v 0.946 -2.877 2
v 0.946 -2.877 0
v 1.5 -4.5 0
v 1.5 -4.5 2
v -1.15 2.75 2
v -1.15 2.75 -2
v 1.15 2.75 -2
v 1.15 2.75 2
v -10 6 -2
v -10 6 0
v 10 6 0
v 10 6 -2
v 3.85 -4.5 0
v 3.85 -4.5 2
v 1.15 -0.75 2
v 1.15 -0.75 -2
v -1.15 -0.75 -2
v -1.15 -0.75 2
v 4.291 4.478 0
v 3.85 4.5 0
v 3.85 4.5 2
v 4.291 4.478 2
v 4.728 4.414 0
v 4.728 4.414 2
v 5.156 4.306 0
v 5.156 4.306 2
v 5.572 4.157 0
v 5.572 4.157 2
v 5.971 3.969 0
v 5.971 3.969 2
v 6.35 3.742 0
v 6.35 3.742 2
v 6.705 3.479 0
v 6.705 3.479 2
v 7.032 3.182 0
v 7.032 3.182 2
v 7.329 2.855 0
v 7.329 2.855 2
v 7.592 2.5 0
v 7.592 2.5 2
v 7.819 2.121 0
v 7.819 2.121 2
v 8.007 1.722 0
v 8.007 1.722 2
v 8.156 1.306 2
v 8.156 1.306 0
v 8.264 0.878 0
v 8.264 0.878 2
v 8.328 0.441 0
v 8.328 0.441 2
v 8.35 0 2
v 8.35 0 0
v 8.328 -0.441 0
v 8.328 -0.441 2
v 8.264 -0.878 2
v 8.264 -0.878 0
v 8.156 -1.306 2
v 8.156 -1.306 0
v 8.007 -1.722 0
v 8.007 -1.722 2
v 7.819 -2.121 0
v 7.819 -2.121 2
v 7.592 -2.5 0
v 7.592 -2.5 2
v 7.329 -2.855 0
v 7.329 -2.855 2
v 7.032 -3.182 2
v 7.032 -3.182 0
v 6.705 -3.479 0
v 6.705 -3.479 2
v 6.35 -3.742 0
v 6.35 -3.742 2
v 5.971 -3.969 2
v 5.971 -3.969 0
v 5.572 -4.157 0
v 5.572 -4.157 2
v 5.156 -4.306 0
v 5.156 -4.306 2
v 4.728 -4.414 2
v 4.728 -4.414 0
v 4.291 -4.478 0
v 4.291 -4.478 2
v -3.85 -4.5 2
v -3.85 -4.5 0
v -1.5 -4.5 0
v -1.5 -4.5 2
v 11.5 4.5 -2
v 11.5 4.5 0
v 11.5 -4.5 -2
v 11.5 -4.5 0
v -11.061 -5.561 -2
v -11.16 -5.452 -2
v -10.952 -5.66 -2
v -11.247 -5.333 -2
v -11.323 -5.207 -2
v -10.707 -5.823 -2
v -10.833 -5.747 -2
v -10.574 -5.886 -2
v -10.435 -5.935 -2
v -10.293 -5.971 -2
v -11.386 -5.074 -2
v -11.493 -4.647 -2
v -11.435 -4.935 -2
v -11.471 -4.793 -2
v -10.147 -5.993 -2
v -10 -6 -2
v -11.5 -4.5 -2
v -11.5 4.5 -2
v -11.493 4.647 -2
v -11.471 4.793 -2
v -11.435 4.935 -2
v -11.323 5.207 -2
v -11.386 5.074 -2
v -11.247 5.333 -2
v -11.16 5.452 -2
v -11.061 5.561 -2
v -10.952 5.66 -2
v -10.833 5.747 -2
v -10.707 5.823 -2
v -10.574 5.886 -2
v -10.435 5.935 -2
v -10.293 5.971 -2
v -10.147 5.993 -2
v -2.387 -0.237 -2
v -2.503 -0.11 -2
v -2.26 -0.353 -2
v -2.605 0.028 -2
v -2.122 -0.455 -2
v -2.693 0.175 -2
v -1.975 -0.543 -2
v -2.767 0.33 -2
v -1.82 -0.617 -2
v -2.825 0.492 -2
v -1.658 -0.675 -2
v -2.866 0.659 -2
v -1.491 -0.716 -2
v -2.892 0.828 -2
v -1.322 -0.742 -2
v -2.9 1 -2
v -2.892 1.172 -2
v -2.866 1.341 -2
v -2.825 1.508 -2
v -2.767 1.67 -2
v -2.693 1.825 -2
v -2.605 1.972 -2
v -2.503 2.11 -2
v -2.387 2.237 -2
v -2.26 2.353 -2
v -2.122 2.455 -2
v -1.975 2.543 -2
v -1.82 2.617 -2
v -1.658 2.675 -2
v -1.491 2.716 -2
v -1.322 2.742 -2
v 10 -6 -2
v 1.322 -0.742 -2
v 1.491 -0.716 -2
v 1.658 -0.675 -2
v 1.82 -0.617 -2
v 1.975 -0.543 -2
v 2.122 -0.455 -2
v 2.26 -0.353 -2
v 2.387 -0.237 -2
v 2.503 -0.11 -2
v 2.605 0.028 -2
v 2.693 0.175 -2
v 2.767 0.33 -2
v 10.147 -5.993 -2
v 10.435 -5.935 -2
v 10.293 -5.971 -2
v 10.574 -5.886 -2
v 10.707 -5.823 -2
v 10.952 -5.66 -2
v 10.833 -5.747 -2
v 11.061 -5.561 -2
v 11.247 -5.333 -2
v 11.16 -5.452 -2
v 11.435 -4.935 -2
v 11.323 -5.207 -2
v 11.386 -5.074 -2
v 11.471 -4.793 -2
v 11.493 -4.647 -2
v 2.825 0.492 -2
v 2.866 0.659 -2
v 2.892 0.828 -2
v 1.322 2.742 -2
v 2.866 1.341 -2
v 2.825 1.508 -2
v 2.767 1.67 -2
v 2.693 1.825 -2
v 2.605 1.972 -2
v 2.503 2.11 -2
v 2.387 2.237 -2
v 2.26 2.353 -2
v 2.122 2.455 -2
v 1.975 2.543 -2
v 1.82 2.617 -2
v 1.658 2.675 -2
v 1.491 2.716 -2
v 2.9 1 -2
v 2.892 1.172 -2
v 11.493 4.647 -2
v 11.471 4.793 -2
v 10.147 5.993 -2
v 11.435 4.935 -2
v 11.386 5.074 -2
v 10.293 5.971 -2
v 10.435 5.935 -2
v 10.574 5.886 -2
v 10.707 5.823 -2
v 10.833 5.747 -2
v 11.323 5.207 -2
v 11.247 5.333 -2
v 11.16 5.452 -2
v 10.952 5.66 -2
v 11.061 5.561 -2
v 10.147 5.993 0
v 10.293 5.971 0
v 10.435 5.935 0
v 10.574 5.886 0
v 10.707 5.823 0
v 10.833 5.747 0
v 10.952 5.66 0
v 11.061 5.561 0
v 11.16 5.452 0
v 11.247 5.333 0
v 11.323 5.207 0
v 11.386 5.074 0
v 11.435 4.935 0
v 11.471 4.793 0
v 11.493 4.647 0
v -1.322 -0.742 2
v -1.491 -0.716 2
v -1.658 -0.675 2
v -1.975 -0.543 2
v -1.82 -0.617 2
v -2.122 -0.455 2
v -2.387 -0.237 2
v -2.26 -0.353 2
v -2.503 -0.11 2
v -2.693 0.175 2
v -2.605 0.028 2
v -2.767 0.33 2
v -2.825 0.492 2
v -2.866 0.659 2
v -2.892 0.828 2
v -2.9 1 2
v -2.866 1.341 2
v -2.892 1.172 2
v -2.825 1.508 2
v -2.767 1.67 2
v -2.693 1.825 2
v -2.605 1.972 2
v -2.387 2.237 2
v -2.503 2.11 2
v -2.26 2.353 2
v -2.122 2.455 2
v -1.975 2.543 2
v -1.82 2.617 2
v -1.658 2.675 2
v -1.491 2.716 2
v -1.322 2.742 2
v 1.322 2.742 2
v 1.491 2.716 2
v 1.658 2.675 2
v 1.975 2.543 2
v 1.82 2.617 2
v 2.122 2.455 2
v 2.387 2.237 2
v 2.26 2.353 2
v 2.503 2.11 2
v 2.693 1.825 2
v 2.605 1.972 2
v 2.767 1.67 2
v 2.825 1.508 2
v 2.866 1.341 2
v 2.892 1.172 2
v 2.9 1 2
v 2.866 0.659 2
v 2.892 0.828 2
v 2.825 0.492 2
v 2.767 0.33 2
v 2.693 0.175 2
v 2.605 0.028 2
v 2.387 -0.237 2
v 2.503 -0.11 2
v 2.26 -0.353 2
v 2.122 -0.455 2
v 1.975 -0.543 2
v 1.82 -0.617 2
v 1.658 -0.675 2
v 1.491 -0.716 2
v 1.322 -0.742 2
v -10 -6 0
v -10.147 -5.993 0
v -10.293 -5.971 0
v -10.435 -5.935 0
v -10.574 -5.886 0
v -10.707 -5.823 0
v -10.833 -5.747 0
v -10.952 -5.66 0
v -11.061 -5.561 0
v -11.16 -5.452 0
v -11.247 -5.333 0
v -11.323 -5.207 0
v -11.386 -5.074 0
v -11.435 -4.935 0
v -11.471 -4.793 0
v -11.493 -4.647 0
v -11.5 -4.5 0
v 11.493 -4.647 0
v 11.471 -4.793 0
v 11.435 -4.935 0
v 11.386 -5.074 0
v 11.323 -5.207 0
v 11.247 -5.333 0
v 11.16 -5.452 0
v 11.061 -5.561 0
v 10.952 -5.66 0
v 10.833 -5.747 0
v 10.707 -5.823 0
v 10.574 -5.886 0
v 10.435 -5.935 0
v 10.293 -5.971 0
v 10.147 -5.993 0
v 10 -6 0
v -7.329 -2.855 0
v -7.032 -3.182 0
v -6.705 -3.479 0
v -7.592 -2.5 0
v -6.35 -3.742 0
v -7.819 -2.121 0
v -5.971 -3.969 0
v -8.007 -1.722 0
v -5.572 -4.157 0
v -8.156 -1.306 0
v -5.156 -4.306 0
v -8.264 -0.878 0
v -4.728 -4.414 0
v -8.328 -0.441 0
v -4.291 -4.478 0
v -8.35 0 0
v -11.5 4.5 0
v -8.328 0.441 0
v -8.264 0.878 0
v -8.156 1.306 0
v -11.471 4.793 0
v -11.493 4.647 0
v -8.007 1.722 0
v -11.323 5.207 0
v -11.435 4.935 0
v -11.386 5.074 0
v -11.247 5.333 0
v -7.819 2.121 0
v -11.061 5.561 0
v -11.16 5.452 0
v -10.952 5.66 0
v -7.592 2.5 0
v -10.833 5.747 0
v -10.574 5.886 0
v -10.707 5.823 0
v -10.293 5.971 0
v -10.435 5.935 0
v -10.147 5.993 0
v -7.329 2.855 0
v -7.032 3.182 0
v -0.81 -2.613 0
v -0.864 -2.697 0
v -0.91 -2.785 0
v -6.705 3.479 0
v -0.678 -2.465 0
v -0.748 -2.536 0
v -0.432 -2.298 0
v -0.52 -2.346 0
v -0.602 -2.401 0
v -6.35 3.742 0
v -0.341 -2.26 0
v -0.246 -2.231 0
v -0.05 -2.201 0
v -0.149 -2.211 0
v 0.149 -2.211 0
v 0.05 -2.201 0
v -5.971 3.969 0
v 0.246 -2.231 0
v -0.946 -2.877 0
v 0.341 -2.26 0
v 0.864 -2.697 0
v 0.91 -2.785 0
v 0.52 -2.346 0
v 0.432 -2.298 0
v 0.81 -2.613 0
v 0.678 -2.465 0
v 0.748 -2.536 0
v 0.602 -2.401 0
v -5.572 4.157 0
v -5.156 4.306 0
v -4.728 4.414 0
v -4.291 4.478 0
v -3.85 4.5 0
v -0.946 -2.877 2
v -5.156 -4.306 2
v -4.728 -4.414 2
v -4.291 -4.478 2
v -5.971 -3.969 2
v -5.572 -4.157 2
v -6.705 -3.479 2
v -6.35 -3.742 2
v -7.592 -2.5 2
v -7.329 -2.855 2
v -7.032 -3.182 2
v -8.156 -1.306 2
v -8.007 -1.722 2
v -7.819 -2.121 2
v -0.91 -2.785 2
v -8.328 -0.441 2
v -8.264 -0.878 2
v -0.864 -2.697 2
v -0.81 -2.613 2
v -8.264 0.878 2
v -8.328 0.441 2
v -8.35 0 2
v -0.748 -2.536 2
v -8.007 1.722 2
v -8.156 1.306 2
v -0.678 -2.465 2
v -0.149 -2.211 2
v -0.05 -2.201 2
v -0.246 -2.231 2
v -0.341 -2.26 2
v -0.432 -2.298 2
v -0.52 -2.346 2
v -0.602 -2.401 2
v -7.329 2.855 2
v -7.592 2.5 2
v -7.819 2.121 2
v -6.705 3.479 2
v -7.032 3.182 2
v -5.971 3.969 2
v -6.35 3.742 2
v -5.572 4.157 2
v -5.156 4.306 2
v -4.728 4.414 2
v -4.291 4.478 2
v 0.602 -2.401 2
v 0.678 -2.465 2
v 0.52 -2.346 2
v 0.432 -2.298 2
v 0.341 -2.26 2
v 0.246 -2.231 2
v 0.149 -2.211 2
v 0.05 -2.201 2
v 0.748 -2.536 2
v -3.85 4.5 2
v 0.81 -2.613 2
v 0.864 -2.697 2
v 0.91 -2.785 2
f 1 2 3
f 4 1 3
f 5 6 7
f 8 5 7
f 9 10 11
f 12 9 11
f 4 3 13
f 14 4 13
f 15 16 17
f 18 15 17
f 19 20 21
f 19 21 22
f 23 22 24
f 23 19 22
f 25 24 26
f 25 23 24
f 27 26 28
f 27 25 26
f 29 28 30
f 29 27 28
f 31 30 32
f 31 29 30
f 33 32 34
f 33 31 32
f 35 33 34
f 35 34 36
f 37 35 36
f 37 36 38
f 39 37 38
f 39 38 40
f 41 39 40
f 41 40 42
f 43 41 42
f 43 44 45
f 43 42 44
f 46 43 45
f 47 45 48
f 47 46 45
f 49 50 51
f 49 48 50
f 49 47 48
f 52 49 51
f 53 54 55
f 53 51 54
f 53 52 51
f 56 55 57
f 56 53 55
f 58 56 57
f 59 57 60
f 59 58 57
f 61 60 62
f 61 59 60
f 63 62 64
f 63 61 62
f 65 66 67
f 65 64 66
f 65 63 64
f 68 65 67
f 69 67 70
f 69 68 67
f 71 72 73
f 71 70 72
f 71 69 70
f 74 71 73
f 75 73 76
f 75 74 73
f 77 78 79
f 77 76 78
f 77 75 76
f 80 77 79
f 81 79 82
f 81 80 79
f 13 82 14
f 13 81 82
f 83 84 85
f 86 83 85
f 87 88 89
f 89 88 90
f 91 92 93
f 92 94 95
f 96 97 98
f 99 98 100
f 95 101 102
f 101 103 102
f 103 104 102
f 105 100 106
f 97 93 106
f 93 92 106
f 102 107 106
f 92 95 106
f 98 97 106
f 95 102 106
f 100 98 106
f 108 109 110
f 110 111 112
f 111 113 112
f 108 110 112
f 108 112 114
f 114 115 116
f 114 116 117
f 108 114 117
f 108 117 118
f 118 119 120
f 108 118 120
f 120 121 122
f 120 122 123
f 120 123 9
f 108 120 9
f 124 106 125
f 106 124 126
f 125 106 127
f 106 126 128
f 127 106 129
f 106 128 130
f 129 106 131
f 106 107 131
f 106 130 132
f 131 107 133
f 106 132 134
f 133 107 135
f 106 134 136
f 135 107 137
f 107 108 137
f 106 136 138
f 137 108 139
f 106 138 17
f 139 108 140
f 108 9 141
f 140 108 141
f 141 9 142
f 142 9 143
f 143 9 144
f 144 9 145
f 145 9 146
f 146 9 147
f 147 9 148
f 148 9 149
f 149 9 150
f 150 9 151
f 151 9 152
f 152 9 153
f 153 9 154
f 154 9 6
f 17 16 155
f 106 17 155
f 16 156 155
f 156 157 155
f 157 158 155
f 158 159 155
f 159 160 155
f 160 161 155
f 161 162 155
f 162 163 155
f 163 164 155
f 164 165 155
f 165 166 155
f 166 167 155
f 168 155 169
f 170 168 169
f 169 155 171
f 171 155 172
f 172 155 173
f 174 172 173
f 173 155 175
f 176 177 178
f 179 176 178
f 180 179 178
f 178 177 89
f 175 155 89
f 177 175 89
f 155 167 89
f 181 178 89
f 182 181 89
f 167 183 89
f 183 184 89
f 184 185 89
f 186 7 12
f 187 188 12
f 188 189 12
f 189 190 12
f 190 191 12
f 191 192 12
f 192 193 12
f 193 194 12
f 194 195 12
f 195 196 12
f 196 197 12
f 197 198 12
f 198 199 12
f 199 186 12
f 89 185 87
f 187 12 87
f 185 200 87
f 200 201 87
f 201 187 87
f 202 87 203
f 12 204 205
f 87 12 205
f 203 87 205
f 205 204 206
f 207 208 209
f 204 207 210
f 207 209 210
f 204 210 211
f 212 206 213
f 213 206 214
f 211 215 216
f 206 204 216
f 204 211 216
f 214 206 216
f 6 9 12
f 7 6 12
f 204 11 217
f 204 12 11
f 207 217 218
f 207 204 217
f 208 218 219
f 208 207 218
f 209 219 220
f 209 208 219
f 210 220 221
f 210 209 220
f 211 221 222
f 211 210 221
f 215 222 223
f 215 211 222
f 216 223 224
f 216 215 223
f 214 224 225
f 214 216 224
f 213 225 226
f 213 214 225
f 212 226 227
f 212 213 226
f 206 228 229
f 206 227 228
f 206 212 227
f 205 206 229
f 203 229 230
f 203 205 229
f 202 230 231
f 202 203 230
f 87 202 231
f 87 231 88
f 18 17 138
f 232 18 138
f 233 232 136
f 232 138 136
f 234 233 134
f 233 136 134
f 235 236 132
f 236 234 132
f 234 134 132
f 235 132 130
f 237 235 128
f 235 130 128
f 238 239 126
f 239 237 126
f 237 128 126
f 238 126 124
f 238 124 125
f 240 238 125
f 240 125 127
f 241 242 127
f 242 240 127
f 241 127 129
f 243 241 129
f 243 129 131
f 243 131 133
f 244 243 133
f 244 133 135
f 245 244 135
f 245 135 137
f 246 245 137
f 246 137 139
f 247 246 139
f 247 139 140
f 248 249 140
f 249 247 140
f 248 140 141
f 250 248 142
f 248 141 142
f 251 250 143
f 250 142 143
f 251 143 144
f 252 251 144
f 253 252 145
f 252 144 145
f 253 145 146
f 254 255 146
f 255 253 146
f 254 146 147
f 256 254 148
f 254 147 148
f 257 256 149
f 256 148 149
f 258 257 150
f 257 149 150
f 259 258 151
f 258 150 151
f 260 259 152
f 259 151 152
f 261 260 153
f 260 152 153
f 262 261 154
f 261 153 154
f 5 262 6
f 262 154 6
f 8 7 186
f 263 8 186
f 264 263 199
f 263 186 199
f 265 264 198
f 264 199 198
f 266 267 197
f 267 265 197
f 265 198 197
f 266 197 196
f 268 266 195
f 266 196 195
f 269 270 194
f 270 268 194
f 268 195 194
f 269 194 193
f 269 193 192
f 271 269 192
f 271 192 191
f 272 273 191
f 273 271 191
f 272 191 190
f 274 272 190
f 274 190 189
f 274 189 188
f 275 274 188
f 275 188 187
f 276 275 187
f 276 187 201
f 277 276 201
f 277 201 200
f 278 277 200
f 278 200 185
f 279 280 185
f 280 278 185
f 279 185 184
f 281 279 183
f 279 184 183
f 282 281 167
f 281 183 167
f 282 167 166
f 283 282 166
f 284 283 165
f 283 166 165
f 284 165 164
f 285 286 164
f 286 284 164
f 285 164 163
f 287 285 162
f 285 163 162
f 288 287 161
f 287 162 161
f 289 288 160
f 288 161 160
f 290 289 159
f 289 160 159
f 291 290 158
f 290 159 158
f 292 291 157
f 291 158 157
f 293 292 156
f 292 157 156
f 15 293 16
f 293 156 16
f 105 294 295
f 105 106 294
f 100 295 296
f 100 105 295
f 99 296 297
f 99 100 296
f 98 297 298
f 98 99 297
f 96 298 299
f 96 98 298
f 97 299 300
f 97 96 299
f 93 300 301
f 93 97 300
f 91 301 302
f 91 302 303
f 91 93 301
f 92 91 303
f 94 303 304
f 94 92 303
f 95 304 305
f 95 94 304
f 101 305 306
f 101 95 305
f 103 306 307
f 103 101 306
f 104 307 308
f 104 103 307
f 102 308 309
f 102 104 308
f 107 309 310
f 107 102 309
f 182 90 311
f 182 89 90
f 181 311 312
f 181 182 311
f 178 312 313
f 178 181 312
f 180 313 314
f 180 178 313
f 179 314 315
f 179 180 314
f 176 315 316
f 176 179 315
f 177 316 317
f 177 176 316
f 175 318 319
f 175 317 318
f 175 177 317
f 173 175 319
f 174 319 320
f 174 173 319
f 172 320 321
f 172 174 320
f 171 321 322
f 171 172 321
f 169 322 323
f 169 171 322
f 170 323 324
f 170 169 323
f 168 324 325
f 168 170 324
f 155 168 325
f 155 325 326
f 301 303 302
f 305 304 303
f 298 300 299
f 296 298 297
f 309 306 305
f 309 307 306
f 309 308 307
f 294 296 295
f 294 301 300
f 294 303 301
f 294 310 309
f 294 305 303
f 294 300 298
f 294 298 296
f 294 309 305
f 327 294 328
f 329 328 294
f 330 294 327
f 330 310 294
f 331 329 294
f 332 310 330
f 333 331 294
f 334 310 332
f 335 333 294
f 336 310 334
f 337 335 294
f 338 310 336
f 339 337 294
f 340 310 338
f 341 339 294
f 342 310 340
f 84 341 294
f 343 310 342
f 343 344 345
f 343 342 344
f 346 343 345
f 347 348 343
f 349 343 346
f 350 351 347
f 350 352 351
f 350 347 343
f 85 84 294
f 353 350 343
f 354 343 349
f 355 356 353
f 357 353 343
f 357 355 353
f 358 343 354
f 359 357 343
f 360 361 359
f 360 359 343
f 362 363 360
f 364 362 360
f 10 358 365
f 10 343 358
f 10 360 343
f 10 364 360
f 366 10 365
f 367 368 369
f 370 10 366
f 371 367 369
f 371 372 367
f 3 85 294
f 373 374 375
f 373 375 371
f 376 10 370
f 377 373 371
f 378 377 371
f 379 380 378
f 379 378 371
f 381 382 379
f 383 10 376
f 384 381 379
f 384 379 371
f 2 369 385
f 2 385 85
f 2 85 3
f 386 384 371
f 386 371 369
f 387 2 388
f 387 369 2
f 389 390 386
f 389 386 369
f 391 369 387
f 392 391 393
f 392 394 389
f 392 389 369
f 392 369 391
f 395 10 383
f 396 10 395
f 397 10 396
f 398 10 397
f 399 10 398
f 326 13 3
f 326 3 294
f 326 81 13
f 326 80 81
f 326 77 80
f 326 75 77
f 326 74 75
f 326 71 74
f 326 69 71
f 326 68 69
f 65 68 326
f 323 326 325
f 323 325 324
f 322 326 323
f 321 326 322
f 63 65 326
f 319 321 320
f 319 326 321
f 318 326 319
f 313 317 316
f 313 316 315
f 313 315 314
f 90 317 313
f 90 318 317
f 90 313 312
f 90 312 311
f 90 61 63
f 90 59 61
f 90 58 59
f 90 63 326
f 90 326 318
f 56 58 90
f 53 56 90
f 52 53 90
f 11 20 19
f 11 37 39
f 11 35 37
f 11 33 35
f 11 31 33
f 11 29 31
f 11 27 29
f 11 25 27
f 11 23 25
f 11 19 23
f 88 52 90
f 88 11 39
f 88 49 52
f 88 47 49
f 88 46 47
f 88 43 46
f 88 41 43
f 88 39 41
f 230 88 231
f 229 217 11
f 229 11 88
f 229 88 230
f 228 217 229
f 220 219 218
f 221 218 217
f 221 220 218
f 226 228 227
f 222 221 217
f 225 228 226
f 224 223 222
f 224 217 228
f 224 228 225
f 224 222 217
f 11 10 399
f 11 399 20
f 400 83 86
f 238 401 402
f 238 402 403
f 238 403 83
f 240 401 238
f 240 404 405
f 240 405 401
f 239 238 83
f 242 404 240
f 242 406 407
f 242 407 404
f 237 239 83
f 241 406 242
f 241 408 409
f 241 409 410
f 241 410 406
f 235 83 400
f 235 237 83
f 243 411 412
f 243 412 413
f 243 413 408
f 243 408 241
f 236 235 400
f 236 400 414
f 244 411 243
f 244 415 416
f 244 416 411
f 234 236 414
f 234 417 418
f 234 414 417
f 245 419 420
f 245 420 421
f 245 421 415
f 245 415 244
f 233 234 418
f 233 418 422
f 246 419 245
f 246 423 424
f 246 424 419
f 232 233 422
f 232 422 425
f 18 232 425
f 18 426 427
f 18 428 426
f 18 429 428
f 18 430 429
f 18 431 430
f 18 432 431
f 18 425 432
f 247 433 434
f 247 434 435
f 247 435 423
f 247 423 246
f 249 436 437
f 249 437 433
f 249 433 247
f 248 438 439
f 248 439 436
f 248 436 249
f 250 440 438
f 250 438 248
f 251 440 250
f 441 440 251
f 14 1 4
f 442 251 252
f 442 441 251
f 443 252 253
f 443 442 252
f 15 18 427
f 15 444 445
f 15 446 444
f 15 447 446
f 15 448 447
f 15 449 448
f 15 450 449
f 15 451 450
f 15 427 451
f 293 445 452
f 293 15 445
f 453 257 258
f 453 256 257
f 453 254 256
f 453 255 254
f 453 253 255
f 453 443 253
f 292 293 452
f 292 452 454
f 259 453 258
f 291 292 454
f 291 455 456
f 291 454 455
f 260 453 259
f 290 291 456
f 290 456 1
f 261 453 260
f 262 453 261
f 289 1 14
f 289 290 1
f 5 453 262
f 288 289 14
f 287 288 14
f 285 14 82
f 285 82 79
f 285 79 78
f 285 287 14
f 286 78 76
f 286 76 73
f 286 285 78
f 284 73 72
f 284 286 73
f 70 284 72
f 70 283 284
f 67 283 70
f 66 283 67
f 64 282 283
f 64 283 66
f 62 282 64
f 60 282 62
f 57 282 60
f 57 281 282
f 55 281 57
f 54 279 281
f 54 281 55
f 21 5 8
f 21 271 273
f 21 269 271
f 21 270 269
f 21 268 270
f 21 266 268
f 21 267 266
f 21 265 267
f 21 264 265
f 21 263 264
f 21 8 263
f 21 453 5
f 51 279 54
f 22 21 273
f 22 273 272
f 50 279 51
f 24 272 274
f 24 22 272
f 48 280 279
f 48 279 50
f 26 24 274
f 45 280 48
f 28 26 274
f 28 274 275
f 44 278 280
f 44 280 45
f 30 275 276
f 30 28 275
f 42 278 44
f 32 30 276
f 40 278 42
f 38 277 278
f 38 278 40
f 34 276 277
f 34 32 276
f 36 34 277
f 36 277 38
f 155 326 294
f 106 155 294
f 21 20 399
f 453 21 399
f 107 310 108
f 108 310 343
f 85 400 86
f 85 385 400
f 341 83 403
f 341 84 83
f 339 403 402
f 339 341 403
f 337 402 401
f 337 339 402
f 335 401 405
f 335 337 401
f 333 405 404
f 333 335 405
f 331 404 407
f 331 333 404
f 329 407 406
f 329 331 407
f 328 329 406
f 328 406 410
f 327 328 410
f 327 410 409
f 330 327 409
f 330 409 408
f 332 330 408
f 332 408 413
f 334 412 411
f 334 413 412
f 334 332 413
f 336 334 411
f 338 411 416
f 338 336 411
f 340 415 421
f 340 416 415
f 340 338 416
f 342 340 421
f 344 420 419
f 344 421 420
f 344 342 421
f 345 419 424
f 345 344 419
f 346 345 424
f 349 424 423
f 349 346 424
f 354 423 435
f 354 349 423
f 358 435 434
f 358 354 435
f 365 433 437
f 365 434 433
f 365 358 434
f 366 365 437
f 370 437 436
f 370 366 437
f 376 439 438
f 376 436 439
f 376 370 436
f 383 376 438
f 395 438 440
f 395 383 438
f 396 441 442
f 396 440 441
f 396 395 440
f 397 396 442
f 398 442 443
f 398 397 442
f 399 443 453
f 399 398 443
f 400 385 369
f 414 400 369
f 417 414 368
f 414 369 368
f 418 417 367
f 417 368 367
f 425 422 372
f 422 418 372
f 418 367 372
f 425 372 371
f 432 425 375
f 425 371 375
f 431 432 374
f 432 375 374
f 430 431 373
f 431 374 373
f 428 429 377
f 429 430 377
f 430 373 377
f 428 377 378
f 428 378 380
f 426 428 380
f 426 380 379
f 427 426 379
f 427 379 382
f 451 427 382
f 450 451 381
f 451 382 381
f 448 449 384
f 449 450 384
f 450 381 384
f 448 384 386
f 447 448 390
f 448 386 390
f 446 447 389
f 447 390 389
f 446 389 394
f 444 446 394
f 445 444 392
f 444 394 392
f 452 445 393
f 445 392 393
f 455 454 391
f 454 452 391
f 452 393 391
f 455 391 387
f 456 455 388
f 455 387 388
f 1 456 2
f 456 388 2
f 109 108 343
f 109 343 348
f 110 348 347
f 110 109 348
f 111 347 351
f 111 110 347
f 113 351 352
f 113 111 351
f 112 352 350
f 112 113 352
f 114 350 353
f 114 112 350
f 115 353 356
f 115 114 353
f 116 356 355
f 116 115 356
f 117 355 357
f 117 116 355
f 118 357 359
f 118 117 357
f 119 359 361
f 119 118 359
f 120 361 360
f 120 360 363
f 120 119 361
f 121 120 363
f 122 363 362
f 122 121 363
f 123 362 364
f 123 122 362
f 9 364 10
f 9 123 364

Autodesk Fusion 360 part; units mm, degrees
sketch "Sketch1" plane through (0, 0, 0) normal (0, 0, 1) x (1, 0, 0)
  line L0 (-3.85, 0) -> (3.85, 0) construction
  line L1 (-3.85, 0) -> (-8.35, 0) construction
  line L2 (3.85, 0) -> (8.35, 0) construction
  line L3 (0, 0) -> (0, -3.2) construction
  line L4 (-3.85, -4.5) -> (3.85, -4.5)
  line L5 (3.85, 4.5) -> (-3.85, 4.5)
  arc A0 (-3.85, 4.5) -> (-3.85, -4.5) centre (-3.85, 0) ccw
  arc A1 (3.85, -4.5) -> (3.85, 4.5) centre (3.85, 0) ccw
  line L6 (-0.9465, -2.8772) -> (-1.5, -4.5)
  line L7 (0.9465, -2.8772) -> (1.5, -4.5)
  arc A2 (0.9465, -2.8772) -> (-0.9465, -2.8772) centre (0, -3.2) ccw
  line L8 (11.5, -6) -> (-11.5, -6)
  line L9 (-11.5, -6) -> (-11.5, 6)
  line L10 (-11.5, 6) -> (11.5, 6)
  line L11 (11.5, 6) -> (11.5, -6)
  line L12 (11.5, -6) -> (-11.5, 6) construction
  line L13 (-11.5, -6) -> (11.5, 6) construction
  line L14 (-1.15, 2.75) -> (1.15, 2.75)
  line L15 (1.15, -0.75) -> (-1.15, -0.75)
  arc A3 (1.15, -0.75) -> (1.15, 2.75) centre (1.15, 1) ccw
  arc A4 (-1.15, 2.75) -> (-1.15, -0.75) centre (-1.15, 1) ccw
  line L16 (-1.15, 1) -> (1.15, 1)
  dimension "d1" = 9
  dimension "d2" = 16.7
  dimension "d3" = 2
  dimension "d4" = 3.2
  dimension "d5" = 3
  dimension "d6" = 12
  dimension "d7" = 23
  dimension "d12" = 3.5
  dimension "d13" = 2.3
  dimension "d20" = 1
extrude "Extrude1" add sketch "Sketch1" against normal blind 2 contours L4 L5 A0 A1 L6 L7 A2 | L4 L6 L7 A2 | L8 L9 L10 L11 | L14 L15 A3 A4
extrude "Extrude2" add sketch "Sketch1" along normal blind 2 contours L4 L5 A0 A1 L6 L7 A2 | L14 L15 A3 A4
extrude "Extrude3" cut sketch "Sketch1" along normal up to surface (2 mm away) and the other way up to surface (2 mm away) contours L14 L15 A3 A4
fillet "Fillet1" radius 1.5 4 edges at (11.5, -6, -1) (-11.5, -6, -1) (-11.5, 6, -1) (11.5, 6, -1)
equation "d6 = 9 mm + 3 mm"
equation "d13 = 5.8 mm - 3.5 mm"
